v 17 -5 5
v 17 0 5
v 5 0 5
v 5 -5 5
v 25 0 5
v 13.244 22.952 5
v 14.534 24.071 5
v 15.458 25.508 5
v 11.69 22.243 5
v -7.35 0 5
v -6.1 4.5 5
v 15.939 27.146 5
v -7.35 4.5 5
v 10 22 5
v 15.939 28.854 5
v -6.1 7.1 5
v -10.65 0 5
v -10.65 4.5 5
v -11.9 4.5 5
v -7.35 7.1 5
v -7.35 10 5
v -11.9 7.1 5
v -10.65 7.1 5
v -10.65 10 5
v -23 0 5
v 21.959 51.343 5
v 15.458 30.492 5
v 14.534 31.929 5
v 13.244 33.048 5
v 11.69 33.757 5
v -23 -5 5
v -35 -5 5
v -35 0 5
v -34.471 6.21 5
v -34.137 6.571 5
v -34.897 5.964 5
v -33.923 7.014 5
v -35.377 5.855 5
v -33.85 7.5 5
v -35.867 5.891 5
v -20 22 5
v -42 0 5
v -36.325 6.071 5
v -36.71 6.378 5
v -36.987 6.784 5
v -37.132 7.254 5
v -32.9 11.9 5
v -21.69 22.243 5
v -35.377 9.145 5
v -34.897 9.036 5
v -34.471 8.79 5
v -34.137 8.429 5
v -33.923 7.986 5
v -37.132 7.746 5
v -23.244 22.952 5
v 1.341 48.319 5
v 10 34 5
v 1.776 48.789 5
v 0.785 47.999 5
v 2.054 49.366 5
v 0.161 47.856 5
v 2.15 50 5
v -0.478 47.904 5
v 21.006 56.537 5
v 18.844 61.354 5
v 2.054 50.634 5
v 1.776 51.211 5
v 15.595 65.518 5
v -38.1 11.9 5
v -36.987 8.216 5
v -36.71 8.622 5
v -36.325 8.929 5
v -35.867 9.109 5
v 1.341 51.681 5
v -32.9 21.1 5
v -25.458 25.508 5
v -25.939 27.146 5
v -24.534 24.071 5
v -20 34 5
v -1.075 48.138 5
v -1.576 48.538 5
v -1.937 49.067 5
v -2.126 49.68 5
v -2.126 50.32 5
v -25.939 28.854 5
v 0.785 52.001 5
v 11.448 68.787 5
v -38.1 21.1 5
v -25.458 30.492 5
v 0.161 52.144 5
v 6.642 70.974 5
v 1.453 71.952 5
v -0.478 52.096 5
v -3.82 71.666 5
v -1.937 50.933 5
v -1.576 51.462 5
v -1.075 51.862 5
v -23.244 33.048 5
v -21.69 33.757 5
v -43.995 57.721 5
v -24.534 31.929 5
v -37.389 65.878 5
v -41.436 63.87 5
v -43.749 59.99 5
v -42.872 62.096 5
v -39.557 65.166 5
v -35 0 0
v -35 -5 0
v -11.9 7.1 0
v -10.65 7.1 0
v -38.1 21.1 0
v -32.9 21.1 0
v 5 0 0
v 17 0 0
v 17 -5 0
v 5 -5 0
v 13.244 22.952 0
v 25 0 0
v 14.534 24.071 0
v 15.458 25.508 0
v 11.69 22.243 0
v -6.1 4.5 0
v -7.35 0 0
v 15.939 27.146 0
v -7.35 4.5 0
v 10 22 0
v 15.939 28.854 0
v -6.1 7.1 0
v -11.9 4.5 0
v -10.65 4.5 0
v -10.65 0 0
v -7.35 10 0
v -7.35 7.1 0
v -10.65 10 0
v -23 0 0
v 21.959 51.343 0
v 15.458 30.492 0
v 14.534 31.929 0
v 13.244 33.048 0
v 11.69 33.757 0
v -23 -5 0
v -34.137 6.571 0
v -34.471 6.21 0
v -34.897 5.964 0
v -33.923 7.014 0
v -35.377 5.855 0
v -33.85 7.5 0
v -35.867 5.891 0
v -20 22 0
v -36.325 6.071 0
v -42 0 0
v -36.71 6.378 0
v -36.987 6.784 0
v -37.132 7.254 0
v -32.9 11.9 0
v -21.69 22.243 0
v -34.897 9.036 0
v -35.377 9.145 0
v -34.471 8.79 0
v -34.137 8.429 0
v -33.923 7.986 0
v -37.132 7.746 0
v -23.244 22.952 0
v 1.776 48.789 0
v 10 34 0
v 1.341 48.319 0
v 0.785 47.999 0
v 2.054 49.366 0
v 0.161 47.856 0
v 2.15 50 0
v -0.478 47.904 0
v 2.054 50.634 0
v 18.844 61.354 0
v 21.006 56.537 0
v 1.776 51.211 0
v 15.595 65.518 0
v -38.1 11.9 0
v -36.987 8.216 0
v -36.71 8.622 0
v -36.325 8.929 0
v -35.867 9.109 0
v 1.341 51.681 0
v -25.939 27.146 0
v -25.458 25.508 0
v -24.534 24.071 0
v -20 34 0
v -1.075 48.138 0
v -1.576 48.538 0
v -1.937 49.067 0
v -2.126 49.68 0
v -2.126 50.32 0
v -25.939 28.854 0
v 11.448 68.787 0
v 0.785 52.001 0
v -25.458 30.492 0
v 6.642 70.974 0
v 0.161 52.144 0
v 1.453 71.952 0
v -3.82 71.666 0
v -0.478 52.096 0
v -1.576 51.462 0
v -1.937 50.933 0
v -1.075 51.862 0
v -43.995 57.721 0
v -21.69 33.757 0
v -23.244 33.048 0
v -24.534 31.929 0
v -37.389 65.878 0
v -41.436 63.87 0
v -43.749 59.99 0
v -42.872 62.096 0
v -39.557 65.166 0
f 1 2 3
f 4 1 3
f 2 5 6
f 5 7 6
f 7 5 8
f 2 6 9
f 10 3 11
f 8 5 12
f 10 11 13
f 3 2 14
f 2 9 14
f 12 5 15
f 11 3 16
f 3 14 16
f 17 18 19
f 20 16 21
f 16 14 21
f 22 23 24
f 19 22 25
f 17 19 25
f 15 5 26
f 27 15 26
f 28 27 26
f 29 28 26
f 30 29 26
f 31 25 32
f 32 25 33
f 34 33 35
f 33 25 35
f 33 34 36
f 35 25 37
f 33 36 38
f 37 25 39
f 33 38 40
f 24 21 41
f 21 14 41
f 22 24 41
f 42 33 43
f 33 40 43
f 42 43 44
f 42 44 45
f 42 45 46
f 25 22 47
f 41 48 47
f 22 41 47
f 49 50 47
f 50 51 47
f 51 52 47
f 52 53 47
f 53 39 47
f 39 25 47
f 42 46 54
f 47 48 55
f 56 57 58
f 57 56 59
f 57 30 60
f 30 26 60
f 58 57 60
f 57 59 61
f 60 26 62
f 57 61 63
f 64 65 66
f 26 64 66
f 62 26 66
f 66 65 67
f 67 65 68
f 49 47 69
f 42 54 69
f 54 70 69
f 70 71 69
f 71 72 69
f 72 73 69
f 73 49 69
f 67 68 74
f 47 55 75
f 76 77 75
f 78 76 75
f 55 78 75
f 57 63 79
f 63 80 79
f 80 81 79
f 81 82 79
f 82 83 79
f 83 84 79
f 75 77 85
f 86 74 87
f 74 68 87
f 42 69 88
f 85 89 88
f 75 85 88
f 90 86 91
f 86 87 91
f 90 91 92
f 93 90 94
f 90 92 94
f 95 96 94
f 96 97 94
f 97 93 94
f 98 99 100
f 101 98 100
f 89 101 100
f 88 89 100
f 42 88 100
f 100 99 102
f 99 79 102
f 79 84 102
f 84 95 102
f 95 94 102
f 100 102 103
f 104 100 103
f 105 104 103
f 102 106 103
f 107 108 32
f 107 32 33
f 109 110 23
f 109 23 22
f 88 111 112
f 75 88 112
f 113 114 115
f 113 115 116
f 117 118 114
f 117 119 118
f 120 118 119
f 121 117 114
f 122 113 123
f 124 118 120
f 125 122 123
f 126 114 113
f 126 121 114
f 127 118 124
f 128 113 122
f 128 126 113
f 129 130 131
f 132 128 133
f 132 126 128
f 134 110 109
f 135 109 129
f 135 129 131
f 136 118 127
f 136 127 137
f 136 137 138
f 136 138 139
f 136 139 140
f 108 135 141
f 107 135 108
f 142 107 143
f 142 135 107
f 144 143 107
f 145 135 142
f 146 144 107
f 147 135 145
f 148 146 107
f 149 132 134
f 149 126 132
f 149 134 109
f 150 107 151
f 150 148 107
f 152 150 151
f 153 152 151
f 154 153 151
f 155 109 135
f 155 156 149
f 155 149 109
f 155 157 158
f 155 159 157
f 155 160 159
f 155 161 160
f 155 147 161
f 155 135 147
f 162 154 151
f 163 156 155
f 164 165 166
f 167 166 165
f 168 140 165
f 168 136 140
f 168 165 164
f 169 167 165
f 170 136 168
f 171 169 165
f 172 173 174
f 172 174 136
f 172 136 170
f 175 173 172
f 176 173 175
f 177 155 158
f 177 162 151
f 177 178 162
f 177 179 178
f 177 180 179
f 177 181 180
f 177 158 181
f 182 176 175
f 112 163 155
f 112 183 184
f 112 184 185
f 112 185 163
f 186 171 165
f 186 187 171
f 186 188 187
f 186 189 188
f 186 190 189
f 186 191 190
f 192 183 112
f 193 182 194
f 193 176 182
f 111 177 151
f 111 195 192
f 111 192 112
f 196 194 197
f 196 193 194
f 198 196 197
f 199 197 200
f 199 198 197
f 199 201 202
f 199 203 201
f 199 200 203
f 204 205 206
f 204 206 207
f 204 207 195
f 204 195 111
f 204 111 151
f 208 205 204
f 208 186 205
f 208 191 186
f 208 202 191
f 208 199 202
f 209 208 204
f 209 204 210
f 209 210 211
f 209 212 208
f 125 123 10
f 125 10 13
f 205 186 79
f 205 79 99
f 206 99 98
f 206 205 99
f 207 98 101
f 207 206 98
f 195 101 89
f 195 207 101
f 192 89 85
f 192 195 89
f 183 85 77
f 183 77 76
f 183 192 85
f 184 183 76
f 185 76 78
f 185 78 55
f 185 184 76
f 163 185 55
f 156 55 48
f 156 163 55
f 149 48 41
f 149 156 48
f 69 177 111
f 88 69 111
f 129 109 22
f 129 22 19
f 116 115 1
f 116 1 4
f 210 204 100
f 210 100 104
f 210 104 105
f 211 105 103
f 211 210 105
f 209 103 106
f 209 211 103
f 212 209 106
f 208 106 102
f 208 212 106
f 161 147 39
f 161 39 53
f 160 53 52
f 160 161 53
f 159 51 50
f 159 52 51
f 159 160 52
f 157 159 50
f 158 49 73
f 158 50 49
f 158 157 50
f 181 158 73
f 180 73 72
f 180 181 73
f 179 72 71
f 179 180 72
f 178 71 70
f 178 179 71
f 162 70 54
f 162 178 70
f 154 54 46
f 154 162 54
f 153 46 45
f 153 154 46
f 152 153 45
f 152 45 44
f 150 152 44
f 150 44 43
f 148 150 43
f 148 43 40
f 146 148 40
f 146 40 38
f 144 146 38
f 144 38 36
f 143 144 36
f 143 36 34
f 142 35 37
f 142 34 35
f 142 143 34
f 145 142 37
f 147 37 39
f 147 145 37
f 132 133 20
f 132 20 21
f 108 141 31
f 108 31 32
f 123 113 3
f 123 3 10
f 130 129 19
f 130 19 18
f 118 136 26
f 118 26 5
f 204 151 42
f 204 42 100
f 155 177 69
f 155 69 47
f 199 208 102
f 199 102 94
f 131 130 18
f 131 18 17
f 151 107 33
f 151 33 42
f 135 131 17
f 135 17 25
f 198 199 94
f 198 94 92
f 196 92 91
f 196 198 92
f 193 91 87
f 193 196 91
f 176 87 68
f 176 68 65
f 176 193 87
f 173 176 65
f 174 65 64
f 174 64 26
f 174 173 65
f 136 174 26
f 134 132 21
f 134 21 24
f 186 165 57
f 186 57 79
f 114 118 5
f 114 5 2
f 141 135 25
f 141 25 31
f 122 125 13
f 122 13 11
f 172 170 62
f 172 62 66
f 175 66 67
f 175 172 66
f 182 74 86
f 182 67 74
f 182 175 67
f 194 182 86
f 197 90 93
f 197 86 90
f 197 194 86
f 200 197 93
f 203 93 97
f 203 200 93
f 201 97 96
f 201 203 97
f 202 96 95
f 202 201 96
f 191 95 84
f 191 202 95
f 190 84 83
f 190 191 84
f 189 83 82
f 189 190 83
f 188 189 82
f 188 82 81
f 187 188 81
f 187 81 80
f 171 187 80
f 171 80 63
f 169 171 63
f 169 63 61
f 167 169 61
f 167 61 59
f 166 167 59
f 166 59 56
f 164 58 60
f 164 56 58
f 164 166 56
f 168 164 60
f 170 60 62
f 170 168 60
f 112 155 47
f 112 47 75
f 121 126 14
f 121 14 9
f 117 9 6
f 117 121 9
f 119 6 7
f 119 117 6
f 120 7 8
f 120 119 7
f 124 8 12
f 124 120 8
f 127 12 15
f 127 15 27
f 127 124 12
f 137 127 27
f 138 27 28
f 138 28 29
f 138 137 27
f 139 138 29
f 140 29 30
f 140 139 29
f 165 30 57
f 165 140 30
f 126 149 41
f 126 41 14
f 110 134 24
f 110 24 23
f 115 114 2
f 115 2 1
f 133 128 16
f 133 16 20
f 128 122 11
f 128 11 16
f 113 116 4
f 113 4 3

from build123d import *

# Parameters (mm, degrees)
ESKIZ_KONTUR_W        = 5.2
ESKIZ_KONTUR_H        = 9.2
PLASTINA_DEPTH        = 5
OTVERSTIYA_DEPTH      = 85.528105852
OTVERSTIYA_DEPTH_BACK = 85.528105852
ESKIZ_OTVERSTIYA_R    = 1.65
ESKIZ_OTVERSTIYA_R_2  = 2.15


with BuildPart() as part:
    # Eskiz_kontur → Plastina (new body)
    with BuildSketch(Plane.XY):
        with BuildLine():
            Line((21.958964111, 51.343070401), (24.999994111, 4.01e-07))
            Line((24.999994111, 4.01e-07), (17, 4.01e-07))
            Line((17, 4.01e-07), (17, -5))
            Line((17, -5), (5, -5))
            Line((5, -5), (5, 0))
            Line((5, 0), (-7.35, 0))
            Line((-7.35, 0), (-7.35, 4.5))
            Line((-7.35, 4.5), (-6.1, 4.5))
            Line((-6.1, 4.5), (-6.1, 7.1))
            Line((-6.1, 7.1), (-7.35, 7.1))
            Line((-7.35, 7.1), (-7.35, 10))
            Line((-7.35, 10), (-10.65, 10))
            Line((-10.65, 10), (-10.65, 7.1))
            Line((-10.65, 7.1), (-11.9, 7.1))
            Line((-11.9, 7.1), (-11.9, 4.5))
            Line((-11.9, 4.5), (-10.65, 4.5))
            Line((-10.65, 4.5), (-10.65, 0))
            Line((-10.65, 0), (-23, 0))
            Line((-23, 0), (-23, -5))
            Line((-23, -5), (-35, -5))
            Line((-35, -5), (-35, 0))
            Line((-35, 0), (-42, 0))
            Line((-42, 0), (-43.99513, 57.7208))
            ThreePointArc((-43.99513, 57.7208), (-42.217170806, 63.034563621), (-37.389183787, 65.878463067))
            Line((-37.389183787, 65.878463067), (-3.820263787, 71.665773067))
            ThreePointArc((-3.820263787, 71.665773067), (13.620063981, 67.276975245), (21.958964111, 51.343070401))
        make_face()
        with Locations((-35.5, 16.5)):
            Rectangle(ESKIZ_KONTUR_W, ESKIZ_KONTUR_H, mode=Mode.SUBTRACT)
        with BuildLine():
            Line((10, 34), (-20, 34))
            ThreePointArc((-20, 34), (-26, 28), (-20, 22))
            Line((-20, 22), (10, 22))
            ThreePointArc((10, 22), (16, 28), (10, 34))
        make_face(mode=Mode.SUBTRACT)
    extrude(amount=PLASTINA_DEPTH)

    # Eskiz_otverstiya → Otverstiya (cut, two sides: drawn at the far end of the back side and taken through both)
    with BuildSketch(Plane.XY.offset(-OTVERSTIYA_DEPTH_BACK)):
        with Locations((-35.5, 7.5)):
            Circle(ESKIZ_OTVERSTIYA_R)
        with Locations((0, 50)):
            Circle(ESKIZ_OTVERSTIYA_R_2)
    extrude(amount=OTVERSTIYA_DEPTH + OTVERSTIYA_DEPTH_BACK, mode=Mode.SUBTRACT)


solid = part.part
